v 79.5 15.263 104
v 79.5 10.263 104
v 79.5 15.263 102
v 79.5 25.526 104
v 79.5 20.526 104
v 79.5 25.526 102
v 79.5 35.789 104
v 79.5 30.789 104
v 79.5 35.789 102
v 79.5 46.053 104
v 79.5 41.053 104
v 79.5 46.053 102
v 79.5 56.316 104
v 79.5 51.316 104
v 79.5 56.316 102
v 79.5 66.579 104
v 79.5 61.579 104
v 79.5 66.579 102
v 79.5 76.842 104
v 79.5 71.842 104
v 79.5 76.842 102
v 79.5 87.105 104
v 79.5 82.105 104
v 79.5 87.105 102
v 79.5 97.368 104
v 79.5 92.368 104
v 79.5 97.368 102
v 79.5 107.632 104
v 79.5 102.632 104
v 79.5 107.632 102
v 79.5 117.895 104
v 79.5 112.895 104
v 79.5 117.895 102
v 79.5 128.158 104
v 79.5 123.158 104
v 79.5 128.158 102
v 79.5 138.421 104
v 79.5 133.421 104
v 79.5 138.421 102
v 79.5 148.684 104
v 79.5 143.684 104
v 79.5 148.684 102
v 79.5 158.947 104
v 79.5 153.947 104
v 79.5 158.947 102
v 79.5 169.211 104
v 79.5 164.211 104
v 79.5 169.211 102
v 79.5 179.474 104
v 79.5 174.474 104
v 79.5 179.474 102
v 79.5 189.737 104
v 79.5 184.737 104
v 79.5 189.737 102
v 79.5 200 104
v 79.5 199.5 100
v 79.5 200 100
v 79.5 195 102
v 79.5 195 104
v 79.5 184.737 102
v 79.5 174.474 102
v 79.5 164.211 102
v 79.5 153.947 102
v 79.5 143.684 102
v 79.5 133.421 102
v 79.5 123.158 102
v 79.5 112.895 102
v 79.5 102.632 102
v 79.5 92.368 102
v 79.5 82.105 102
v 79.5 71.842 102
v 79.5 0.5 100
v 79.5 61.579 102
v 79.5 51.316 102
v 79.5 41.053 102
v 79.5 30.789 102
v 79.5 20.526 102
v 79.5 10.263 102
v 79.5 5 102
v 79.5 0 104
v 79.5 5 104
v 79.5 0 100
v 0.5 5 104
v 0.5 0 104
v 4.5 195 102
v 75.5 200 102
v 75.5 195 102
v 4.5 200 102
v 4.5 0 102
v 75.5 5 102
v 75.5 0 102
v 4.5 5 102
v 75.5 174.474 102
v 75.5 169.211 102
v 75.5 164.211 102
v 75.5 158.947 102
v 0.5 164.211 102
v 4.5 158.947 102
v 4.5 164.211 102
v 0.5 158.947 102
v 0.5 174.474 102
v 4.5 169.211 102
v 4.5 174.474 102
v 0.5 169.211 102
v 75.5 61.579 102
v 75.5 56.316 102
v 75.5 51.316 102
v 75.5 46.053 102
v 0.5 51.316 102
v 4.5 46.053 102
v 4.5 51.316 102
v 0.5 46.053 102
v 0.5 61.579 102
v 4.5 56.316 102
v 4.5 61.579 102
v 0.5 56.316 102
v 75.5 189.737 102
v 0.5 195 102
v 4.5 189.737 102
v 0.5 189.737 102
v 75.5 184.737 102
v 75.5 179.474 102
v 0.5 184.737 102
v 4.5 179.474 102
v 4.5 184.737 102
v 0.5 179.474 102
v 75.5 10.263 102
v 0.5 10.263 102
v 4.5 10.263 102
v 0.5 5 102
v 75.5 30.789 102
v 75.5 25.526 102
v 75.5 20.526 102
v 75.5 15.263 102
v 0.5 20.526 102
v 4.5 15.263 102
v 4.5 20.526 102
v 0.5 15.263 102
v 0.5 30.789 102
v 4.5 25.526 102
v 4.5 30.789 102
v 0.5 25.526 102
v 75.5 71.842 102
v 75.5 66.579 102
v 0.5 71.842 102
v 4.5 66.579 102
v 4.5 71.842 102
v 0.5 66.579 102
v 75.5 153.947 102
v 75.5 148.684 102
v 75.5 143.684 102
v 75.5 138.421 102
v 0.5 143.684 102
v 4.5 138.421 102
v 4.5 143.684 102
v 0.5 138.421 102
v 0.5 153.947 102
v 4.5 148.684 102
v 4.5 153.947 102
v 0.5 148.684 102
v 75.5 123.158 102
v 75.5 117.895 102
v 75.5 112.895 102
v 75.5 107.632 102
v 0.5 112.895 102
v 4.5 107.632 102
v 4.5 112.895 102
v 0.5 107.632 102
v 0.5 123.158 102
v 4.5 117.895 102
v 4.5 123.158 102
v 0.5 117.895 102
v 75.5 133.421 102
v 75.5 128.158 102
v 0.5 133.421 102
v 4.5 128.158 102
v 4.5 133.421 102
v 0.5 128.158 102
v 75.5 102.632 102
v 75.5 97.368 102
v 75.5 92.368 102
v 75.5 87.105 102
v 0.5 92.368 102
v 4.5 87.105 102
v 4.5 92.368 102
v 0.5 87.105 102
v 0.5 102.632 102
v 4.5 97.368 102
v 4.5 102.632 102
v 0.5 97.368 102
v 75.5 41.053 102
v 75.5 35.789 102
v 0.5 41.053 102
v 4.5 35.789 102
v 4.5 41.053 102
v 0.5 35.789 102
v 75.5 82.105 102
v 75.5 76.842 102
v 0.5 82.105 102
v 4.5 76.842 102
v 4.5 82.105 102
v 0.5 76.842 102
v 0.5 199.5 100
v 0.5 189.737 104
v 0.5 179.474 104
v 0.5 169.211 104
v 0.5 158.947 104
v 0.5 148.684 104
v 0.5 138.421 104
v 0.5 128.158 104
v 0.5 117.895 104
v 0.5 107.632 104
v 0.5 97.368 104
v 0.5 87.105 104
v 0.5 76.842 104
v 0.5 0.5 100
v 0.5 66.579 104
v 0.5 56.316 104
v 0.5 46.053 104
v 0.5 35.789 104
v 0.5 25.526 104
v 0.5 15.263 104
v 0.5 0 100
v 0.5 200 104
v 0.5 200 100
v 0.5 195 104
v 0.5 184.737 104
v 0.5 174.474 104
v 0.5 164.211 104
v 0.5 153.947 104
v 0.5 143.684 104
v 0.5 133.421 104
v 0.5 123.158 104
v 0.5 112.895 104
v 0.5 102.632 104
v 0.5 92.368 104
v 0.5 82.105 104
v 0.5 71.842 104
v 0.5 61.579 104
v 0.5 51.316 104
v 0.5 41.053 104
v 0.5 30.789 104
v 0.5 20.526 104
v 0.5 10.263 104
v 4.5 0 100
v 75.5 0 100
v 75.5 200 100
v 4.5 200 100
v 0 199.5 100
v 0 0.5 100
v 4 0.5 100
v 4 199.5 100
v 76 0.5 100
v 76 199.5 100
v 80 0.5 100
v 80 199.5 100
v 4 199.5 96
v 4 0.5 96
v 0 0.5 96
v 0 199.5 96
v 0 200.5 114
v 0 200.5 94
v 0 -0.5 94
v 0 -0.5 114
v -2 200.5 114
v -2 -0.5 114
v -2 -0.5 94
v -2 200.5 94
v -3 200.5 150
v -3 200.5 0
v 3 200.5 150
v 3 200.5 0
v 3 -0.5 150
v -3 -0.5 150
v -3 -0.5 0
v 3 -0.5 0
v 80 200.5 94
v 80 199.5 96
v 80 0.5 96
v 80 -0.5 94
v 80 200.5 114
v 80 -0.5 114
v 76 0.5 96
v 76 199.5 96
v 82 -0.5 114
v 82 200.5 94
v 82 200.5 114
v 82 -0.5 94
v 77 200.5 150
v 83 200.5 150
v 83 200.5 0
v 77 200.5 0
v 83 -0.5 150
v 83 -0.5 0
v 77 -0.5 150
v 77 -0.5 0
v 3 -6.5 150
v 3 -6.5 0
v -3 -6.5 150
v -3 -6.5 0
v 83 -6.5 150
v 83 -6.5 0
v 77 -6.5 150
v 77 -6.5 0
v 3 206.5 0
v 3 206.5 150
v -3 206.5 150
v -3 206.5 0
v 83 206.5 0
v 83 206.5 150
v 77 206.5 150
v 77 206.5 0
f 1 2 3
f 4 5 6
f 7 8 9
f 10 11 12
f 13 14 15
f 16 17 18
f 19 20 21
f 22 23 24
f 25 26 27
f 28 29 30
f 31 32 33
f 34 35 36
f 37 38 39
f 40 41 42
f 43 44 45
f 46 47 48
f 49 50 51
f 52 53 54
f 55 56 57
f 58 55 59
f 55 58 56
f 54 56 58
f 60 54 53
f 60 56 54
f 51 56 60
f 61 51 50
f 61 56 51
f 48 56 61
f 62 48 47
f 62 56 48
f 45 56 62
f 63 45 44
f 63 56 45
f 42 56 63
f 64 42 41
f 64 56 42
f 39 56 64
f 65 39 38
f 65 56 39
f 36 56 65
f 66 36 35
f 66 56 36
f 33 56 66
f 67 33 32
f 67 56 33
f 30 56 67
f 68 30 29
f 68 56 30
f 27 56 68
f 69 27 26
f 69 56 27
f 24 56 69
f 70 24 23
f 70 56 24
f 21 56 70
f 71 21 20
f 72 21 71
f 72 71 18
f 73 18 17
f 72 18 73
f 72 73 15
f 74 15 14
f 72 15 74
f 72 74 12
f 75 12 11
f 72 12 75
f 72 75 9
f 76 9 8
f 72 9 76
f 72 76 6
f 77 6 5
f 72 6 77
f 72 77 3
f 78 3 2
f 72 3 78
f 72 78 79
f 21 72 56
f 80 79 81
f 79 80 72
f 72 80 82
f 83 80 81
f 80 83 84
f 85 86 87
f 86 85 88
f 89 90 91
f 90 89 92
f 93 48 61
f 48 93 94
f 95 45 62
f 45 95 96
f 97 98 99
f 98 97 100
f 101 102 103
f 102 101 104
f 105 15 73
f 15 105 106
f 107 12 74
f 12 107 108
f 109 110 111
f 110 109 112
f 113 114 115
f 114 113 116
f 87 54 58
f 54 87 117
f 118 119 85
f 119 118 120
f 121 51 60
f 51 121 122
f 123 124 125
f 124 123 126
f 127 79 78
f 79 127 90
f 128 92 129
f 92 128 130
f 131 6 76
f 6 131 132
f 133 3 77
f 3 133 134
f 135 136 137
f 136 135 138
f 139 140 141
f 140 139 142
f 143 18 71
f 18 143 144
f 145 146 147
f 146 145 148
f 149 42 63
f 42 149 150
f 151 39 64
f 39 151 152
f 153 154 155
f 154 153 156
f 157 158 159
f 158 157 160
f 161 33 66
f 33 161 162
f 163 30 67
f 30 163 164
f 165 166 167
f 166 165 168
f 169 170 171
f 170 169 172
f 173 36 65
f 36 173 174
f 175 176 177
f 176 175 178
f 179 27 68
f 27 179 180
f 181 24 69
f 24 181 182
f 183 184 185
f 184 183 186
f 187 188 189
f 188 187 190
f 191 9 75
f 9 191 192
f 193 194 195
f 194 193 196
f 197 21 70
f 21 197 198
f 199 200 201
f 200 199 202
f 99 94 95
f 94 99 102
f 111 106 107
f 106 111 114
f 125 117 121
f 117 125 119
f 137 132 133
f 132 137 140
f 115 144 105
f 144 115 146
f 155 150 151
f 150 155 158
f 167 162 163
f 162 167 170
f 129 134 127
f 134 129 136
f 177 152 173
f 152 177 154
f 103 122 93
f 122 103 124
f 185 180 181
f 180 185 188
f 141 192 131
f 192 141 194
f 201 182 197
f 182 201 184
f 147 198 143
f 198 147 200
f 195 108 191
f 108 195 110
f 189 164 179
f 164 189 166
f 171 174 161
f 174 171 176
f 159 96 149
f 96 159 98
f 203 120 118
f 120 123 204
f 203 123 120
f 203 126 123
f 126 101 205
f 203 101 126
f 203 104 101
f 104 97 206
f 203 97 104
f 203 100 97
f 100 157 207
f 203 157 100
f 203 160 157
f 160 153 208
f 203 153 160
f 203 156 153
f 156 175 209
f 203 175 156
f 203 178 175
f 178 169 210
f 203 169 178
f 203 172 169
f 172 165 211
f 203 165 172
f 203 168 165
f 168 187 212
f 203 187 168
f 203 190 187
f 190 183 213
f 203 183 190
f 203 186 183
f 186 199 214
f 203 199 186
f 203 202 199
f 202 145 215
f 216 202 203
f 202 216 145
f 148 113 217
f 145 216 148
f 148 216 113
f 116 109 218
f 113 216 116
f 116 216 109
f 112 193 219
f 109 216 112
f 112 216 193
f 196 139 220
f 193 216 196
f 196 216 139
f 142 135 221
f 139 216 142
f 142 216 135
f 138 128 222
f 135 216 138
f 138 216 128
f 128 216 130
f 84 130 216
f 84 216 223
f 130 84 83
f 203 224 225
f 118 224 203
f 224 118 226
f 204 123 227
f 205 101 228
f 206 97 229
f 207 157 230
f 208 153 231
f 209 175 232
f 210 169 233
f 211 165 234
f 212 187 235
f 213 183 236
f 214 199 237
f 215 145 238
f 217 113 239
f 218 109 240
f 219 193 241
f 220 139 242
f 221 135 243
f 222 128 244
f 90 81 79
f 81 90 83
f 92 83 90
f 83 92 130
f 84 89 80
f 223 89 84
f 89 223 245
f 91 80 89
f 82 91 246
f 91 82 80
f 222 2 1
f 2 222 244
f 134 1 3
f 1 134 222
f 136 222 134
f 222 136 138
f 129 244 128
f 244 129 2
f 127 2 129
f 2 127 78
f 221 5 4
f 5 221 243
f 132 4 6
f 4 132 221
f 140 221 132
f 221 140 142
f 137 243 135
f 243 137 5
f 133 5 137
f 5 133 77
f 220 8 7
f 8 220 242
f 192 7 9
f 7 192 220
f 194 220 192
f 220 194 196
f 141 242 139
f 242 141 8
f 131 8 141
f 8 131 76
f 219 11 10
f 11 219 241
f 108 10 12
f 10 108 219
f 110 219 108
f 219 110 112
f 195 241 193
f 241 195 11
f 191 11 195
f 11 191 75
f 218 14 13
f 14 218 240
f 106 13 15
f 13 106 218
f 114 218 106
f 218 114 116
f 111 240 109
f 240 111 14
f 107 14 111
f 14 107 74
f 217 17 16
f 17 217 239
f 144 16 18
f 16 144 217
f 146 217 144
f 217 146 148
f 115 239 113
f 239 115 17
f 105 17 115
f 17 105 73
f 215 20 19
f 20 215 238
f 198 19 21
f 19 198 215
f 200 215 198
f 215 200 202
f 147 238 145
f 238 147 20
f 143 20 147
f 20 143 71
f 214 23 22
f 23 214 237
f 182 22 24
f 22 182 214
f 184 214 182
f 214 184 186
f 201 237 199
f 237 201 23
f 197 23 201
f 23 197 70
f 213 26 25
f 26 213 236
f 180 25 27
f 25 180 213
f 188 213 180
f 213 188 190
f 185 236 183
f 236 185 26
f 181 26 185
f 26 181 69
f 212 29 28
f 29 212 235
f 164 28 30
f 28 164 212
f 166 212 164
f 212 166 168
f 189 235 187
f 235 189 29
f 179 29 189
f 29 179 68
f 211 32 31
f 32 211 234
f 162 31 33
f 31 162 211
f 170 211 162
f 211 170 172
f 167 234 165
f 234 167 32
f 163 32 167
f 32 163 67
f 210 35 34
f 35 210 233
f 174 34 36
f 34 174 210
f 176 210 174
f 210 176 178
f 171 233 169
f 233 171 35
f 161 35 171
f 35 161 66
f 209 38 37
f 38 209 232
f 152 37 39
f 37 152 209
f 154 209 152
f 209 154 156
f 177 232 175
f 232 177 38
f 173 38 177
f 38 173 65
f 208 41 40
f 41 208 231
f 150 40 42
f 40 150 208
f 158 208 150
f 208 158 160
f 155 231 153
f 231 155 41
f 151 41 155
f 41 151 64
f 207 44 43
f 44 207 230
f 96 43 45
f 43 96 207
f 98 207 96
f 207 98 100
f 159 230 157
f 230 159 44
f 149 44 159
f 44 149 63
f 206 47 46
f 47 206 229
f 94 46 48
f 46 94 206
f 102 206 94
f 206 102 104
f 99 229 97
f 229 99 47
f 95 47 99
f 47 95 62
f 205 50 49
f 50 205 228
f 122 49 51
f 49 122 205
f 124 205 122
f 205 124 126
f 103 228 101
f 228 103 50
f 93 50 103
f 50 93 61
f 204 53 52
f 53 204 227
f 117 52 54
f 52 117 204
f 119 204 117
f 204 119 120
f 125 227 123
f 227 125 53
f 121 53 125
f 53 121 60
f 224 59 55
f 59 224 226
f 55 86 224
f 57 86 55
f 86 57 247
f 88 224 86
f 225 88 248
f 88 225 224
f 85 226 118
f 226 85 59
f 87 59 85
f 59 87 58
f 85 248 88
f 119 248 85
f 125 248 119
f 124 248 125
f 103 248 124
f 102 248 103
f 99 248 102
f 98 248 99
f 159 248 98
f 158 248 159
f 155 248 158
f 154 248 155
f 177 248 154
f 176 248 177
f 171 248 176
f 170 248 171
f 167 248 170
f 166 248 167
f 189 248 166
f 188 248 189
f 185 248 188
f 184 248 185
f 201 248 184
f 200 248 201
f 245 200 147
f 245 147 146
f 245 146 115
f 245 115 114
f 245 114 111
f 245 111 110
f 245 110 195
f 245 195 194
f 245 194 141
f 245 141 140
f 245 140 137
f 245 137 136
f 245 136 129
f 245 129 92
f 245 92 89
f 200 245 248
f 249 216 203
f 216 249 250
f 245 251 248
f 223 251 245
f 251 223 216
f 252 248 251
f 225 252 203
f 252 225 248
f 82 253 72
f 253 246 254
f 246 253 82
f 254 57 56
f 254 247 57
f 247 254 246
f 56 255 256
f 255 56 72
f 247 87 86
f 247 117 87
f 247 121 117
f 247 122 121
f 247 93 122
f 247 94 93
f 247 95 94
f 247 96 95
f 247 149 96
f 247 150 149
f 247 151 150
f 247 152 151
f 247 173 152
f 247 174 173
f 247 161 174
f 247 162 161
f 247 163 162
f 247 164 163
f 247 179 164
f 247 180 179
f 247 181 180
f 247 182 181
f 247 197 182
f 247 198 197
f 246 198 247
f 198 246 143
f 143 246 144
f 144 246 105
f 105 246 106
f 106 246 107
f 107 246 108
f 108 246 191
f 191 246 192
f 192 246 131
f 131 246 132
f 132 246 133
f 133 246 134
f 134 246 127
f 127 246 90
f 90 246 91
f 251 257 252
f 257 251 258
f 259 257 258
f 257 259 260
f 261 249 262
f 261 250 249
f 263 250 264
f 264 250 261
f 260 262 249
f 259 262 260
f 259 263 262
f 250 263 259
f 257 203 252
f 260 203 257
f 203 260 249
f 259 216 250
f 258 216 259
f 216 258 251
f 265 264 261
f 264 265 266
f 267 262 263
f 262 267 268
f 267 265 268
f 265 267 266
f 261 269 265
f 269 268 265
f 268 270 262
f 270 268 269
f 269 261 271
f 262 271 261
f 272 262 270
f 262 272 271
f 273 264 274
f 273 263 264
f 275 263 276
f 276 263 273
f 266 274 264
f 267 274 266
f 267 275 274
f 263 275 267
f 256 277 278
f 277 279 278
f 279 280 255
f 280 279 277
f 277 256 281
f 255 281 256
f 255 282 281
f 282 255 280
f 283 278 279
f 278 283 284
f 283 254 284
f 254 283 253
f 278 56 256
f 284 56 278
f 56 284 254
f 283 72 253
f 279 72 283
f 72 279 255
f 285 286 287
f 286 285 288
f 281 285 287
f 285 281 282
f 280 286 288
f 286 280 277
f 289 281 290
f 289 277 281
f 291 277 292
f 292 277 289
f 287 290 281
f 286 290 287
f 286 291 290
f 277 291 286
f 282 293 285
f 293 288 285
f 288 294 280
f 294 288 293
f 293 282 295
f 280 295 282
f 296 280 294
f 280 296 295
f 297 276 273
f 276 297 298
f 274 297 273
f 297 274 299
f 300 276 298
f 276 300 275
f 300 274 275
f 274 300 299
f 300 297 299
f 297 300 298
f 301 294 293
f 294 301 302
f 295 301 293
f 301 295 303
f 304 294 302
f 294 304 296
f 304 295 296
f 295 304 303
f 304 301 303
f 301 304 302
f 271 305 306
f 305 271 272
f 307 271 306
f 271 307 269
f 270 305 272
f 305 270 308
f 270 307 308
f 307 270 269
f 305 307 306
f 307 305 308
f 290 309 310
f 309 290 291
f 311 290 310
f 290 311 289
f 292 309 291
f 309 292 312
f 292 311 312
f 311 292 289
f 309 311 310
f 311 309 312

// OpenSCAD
// Einheiten: cm

SPIEL = 1 ;

BETT_BREITE_OBEN = 80;
BETT_LAENGE = 200;


LIEGEHOEHE_OBEN = 100 ;

LATTEN_DICKE = 2 ;

BETT_PLANKE_DICKE = 2 ;
BETT_PLANKE_HOEHE = 20 ;

BETT_PFOSTEN_DICKE = 6 ;
BETT_PFOSTEN_HOEHE = 150 ;


module lattenrost(bett_breite,
                  bett_laenge,
                  raumlage=[0, 0, 0],
                  raumwinkel=[0, 0, 0],
                  latten_dicke=2,
                  latten_breite=5,
                  latten_anzahl=20)
{
    zaehler = latten_anzahl-1;
    
    rotate(raumwinkel) {
        translate(raumlage + [0, 0, latten_dicke]) {
            for (ii = [ 0 : 1 : zaehler]) {
                translate([0, ii * (bett_laenge-latten_breite)/zaehler, 0]) {
                    cube([bett_breite, latten_breite, latten_dicke]);
                }
            }
            translate([0, 0, -latten_dicke]) {
                cube([2*latten_dicke, bett_laenge, latten_dicke]);
            }
            translate([bett_breite-2*latten_dicke, 0, -latten_dicke]) {
                cube([2*latten_dicke, bett_laenge, latten_dicke]);
            }
        }
    }     
}
  

 lattenrost(BETT_BREITE_OBEN-SPIEL,
            BETT_LAENGE,
            raumlage=[SPIEL/2, 0, LIEGEHOEHE_OBEN],
            latten_dicke=LATTEN_DICKE);



// Lattenrostauflage OBEN HINTEN
translate([0, SPIEL/2, LIEGEHOEHE_OBEN-2*LATTEN_DICKE]) {
    cube([2*LATTEN_DICKE, BETT_LAENGE-SPIEL, 2*LATTEN_DICKE]);
}
translate([-BETT_PLANKE_DICKE, -SPIEL/2, LIEGEHOEHE_OBEN-3*LATTEN_DICKE]) {
    cube([BETT_PLANKE_DICKE, BETT_LAENGE+SPIEL, BETT_PLANKE_HOEHE]) ;
}

// Lattenrostauflage OBEN VORNE
translate([BETT_BREITE_OBEN-2*LATTEN_DICKE, 
           SPIEL/2, 
           LIEGEHOEHE_OBEN-2*LATTEN_DICKE]) {
    cube([2*LATTEN_DICKE, BETT_LAENGE-SPIEL, 2*LATTEN_DICKE]);
}
translate([BETT_BREITE_OBEN,
           -SPIEL/2,
           LIEGEHOEHE_OBEN-3*LATTEN_DICKE]) {
    cube([BETT_PLANKE_DICKE, BETT_LAENGE+SPIEL, BETT_PLANKE_HOEHE]) ;
}

// BETTPFOSTEN_HINTEN_0
translate([-BETT_PLANKE_DICKE-SPIEL, -BETT_PFOSTEN_DICKE-SPIEL/2, 0]) {
    cube([BETT_PFOSTEN_DICKE, BETT_PFOSTEN_DICKE, BETT_PFOSTEN_HOEHE]) ;
}

// BETTPFOSTEN MITTE 0
translate([-BETT_PLANKE_DICKE-SPIEL+BETT_BREITE_OBEN, 
           -BETT_PFOSTEN_DICKE-SPIEL/2, 
           0]) {
    cube([BETT_PFOSTEN_DICKE, BETT_PFOSTEN_DICKE, BETT_PFOSTEN_HOEHE]) ;
}


// BETTPFOSTEN_HINTEN_+
translate([-BETT_PLANKE_DICKE-SPIEL, BETT_LAENGE+SPIEL/2, 0]) {
    cube([BETT_PFOSTEN_DICKE, BETT_PFOSTEN_DICKE, BETT_PFOSTEN_HOEHE]) ;
}

// BETTPFOSTEN MITTE +
translate([-BETT_PLANKE_DICKE-SPIEL+BETT_BREITE_OBEN, 
           BETT_LAENGE+SPIEL/2, 
           0]) {
    cube([BETT_PFOSTEN_DICKE, BETT_PFOSTEN_DICKE, BETT_PFOSTEN_HOEHE]) ;
}


/*
BETT_BREITE_UNTEN = 100;
LIEGEHOEHE_UNTEN = 30 ;
BETT_KANTE_HOEHE = 50 ;

// Lattenrostauflage UNTEN HINTEN
translate([0, SPIEL/2, LIEGEHOEHE_UNTEN-2*LATTEN_DICKE]) {
    cube([2*LATTEN_DICKE, BETT_LAENGE-SPIEL, 2*LATTEN_DICKE]);
}
translate([-BETT_PLANKE_DICKE, -SPIEL/2, LIEGEHOEHE_UNTEN-3*LATTEN_DICKE]) {
    cube([BETT_PLANKE_DICKE, BETT_LAENGE+SPIEL, BETT_PLANKE_HOEHE]) ;
}

// Lattenrostauflage UNTEN VORNE
translate([BETT_BREITE_UNTEN-2*LATTEN_DICKE, 
           SPIEL/2, 
           LIEGEHOEHE_UNTEN-2*LATTEN_DICKE]) {
    cube([2*LATTEN_DICKE, BETT_LAENGE-SPIEL, 2*LATTEN_DICKE]);
}
translate([BETT_BREITE_UNTEN,
           -SPIEL/2,
           LIEGEHOEHE_UNTEN-3*LATTEN_DICKE]) {
    cube([BETT_PLANKE_DICKE, BETT_LAENGE+SPIEL, BETT_PLANKE_HOEHE]) ;
}


// BETTPFOSTEN VORNE 0
translate([-BETT_PLANKE_DICKE-SPIEL+BETT_BREITE_UNTEN, 
           -BETT_PFOSTEN_DICKE-SPIEL/2, 
           0]) {
    cube([BETT_PFOSTEN_DICKE, BETT_PFOSTEN_DICKE, BETT_KANTE_HOEHE]) ;
}


// BETTPFOSTEN VORNE +
translate([-BETT_PLANKE_DICKE-SPIEL+BETT_BREITE_UNTEN, 
           BETT_LAENGE+SPIEL/2, 
           0]) {
    cube([BETT_PFOSTEN_DICKE, BETT_PFOSTEN_DICKE, BETT_KANTE_HOEHE]) ;
}


lattenrost(BETT_BREITE_UNTEN-SPIEL,
           BETT_LAENGE,
           raumlage=[SPIEL/2, 0, LIEGEHOEHE_UNTEN],
           latten_dicke=LATTEN_DICKE);






*/
